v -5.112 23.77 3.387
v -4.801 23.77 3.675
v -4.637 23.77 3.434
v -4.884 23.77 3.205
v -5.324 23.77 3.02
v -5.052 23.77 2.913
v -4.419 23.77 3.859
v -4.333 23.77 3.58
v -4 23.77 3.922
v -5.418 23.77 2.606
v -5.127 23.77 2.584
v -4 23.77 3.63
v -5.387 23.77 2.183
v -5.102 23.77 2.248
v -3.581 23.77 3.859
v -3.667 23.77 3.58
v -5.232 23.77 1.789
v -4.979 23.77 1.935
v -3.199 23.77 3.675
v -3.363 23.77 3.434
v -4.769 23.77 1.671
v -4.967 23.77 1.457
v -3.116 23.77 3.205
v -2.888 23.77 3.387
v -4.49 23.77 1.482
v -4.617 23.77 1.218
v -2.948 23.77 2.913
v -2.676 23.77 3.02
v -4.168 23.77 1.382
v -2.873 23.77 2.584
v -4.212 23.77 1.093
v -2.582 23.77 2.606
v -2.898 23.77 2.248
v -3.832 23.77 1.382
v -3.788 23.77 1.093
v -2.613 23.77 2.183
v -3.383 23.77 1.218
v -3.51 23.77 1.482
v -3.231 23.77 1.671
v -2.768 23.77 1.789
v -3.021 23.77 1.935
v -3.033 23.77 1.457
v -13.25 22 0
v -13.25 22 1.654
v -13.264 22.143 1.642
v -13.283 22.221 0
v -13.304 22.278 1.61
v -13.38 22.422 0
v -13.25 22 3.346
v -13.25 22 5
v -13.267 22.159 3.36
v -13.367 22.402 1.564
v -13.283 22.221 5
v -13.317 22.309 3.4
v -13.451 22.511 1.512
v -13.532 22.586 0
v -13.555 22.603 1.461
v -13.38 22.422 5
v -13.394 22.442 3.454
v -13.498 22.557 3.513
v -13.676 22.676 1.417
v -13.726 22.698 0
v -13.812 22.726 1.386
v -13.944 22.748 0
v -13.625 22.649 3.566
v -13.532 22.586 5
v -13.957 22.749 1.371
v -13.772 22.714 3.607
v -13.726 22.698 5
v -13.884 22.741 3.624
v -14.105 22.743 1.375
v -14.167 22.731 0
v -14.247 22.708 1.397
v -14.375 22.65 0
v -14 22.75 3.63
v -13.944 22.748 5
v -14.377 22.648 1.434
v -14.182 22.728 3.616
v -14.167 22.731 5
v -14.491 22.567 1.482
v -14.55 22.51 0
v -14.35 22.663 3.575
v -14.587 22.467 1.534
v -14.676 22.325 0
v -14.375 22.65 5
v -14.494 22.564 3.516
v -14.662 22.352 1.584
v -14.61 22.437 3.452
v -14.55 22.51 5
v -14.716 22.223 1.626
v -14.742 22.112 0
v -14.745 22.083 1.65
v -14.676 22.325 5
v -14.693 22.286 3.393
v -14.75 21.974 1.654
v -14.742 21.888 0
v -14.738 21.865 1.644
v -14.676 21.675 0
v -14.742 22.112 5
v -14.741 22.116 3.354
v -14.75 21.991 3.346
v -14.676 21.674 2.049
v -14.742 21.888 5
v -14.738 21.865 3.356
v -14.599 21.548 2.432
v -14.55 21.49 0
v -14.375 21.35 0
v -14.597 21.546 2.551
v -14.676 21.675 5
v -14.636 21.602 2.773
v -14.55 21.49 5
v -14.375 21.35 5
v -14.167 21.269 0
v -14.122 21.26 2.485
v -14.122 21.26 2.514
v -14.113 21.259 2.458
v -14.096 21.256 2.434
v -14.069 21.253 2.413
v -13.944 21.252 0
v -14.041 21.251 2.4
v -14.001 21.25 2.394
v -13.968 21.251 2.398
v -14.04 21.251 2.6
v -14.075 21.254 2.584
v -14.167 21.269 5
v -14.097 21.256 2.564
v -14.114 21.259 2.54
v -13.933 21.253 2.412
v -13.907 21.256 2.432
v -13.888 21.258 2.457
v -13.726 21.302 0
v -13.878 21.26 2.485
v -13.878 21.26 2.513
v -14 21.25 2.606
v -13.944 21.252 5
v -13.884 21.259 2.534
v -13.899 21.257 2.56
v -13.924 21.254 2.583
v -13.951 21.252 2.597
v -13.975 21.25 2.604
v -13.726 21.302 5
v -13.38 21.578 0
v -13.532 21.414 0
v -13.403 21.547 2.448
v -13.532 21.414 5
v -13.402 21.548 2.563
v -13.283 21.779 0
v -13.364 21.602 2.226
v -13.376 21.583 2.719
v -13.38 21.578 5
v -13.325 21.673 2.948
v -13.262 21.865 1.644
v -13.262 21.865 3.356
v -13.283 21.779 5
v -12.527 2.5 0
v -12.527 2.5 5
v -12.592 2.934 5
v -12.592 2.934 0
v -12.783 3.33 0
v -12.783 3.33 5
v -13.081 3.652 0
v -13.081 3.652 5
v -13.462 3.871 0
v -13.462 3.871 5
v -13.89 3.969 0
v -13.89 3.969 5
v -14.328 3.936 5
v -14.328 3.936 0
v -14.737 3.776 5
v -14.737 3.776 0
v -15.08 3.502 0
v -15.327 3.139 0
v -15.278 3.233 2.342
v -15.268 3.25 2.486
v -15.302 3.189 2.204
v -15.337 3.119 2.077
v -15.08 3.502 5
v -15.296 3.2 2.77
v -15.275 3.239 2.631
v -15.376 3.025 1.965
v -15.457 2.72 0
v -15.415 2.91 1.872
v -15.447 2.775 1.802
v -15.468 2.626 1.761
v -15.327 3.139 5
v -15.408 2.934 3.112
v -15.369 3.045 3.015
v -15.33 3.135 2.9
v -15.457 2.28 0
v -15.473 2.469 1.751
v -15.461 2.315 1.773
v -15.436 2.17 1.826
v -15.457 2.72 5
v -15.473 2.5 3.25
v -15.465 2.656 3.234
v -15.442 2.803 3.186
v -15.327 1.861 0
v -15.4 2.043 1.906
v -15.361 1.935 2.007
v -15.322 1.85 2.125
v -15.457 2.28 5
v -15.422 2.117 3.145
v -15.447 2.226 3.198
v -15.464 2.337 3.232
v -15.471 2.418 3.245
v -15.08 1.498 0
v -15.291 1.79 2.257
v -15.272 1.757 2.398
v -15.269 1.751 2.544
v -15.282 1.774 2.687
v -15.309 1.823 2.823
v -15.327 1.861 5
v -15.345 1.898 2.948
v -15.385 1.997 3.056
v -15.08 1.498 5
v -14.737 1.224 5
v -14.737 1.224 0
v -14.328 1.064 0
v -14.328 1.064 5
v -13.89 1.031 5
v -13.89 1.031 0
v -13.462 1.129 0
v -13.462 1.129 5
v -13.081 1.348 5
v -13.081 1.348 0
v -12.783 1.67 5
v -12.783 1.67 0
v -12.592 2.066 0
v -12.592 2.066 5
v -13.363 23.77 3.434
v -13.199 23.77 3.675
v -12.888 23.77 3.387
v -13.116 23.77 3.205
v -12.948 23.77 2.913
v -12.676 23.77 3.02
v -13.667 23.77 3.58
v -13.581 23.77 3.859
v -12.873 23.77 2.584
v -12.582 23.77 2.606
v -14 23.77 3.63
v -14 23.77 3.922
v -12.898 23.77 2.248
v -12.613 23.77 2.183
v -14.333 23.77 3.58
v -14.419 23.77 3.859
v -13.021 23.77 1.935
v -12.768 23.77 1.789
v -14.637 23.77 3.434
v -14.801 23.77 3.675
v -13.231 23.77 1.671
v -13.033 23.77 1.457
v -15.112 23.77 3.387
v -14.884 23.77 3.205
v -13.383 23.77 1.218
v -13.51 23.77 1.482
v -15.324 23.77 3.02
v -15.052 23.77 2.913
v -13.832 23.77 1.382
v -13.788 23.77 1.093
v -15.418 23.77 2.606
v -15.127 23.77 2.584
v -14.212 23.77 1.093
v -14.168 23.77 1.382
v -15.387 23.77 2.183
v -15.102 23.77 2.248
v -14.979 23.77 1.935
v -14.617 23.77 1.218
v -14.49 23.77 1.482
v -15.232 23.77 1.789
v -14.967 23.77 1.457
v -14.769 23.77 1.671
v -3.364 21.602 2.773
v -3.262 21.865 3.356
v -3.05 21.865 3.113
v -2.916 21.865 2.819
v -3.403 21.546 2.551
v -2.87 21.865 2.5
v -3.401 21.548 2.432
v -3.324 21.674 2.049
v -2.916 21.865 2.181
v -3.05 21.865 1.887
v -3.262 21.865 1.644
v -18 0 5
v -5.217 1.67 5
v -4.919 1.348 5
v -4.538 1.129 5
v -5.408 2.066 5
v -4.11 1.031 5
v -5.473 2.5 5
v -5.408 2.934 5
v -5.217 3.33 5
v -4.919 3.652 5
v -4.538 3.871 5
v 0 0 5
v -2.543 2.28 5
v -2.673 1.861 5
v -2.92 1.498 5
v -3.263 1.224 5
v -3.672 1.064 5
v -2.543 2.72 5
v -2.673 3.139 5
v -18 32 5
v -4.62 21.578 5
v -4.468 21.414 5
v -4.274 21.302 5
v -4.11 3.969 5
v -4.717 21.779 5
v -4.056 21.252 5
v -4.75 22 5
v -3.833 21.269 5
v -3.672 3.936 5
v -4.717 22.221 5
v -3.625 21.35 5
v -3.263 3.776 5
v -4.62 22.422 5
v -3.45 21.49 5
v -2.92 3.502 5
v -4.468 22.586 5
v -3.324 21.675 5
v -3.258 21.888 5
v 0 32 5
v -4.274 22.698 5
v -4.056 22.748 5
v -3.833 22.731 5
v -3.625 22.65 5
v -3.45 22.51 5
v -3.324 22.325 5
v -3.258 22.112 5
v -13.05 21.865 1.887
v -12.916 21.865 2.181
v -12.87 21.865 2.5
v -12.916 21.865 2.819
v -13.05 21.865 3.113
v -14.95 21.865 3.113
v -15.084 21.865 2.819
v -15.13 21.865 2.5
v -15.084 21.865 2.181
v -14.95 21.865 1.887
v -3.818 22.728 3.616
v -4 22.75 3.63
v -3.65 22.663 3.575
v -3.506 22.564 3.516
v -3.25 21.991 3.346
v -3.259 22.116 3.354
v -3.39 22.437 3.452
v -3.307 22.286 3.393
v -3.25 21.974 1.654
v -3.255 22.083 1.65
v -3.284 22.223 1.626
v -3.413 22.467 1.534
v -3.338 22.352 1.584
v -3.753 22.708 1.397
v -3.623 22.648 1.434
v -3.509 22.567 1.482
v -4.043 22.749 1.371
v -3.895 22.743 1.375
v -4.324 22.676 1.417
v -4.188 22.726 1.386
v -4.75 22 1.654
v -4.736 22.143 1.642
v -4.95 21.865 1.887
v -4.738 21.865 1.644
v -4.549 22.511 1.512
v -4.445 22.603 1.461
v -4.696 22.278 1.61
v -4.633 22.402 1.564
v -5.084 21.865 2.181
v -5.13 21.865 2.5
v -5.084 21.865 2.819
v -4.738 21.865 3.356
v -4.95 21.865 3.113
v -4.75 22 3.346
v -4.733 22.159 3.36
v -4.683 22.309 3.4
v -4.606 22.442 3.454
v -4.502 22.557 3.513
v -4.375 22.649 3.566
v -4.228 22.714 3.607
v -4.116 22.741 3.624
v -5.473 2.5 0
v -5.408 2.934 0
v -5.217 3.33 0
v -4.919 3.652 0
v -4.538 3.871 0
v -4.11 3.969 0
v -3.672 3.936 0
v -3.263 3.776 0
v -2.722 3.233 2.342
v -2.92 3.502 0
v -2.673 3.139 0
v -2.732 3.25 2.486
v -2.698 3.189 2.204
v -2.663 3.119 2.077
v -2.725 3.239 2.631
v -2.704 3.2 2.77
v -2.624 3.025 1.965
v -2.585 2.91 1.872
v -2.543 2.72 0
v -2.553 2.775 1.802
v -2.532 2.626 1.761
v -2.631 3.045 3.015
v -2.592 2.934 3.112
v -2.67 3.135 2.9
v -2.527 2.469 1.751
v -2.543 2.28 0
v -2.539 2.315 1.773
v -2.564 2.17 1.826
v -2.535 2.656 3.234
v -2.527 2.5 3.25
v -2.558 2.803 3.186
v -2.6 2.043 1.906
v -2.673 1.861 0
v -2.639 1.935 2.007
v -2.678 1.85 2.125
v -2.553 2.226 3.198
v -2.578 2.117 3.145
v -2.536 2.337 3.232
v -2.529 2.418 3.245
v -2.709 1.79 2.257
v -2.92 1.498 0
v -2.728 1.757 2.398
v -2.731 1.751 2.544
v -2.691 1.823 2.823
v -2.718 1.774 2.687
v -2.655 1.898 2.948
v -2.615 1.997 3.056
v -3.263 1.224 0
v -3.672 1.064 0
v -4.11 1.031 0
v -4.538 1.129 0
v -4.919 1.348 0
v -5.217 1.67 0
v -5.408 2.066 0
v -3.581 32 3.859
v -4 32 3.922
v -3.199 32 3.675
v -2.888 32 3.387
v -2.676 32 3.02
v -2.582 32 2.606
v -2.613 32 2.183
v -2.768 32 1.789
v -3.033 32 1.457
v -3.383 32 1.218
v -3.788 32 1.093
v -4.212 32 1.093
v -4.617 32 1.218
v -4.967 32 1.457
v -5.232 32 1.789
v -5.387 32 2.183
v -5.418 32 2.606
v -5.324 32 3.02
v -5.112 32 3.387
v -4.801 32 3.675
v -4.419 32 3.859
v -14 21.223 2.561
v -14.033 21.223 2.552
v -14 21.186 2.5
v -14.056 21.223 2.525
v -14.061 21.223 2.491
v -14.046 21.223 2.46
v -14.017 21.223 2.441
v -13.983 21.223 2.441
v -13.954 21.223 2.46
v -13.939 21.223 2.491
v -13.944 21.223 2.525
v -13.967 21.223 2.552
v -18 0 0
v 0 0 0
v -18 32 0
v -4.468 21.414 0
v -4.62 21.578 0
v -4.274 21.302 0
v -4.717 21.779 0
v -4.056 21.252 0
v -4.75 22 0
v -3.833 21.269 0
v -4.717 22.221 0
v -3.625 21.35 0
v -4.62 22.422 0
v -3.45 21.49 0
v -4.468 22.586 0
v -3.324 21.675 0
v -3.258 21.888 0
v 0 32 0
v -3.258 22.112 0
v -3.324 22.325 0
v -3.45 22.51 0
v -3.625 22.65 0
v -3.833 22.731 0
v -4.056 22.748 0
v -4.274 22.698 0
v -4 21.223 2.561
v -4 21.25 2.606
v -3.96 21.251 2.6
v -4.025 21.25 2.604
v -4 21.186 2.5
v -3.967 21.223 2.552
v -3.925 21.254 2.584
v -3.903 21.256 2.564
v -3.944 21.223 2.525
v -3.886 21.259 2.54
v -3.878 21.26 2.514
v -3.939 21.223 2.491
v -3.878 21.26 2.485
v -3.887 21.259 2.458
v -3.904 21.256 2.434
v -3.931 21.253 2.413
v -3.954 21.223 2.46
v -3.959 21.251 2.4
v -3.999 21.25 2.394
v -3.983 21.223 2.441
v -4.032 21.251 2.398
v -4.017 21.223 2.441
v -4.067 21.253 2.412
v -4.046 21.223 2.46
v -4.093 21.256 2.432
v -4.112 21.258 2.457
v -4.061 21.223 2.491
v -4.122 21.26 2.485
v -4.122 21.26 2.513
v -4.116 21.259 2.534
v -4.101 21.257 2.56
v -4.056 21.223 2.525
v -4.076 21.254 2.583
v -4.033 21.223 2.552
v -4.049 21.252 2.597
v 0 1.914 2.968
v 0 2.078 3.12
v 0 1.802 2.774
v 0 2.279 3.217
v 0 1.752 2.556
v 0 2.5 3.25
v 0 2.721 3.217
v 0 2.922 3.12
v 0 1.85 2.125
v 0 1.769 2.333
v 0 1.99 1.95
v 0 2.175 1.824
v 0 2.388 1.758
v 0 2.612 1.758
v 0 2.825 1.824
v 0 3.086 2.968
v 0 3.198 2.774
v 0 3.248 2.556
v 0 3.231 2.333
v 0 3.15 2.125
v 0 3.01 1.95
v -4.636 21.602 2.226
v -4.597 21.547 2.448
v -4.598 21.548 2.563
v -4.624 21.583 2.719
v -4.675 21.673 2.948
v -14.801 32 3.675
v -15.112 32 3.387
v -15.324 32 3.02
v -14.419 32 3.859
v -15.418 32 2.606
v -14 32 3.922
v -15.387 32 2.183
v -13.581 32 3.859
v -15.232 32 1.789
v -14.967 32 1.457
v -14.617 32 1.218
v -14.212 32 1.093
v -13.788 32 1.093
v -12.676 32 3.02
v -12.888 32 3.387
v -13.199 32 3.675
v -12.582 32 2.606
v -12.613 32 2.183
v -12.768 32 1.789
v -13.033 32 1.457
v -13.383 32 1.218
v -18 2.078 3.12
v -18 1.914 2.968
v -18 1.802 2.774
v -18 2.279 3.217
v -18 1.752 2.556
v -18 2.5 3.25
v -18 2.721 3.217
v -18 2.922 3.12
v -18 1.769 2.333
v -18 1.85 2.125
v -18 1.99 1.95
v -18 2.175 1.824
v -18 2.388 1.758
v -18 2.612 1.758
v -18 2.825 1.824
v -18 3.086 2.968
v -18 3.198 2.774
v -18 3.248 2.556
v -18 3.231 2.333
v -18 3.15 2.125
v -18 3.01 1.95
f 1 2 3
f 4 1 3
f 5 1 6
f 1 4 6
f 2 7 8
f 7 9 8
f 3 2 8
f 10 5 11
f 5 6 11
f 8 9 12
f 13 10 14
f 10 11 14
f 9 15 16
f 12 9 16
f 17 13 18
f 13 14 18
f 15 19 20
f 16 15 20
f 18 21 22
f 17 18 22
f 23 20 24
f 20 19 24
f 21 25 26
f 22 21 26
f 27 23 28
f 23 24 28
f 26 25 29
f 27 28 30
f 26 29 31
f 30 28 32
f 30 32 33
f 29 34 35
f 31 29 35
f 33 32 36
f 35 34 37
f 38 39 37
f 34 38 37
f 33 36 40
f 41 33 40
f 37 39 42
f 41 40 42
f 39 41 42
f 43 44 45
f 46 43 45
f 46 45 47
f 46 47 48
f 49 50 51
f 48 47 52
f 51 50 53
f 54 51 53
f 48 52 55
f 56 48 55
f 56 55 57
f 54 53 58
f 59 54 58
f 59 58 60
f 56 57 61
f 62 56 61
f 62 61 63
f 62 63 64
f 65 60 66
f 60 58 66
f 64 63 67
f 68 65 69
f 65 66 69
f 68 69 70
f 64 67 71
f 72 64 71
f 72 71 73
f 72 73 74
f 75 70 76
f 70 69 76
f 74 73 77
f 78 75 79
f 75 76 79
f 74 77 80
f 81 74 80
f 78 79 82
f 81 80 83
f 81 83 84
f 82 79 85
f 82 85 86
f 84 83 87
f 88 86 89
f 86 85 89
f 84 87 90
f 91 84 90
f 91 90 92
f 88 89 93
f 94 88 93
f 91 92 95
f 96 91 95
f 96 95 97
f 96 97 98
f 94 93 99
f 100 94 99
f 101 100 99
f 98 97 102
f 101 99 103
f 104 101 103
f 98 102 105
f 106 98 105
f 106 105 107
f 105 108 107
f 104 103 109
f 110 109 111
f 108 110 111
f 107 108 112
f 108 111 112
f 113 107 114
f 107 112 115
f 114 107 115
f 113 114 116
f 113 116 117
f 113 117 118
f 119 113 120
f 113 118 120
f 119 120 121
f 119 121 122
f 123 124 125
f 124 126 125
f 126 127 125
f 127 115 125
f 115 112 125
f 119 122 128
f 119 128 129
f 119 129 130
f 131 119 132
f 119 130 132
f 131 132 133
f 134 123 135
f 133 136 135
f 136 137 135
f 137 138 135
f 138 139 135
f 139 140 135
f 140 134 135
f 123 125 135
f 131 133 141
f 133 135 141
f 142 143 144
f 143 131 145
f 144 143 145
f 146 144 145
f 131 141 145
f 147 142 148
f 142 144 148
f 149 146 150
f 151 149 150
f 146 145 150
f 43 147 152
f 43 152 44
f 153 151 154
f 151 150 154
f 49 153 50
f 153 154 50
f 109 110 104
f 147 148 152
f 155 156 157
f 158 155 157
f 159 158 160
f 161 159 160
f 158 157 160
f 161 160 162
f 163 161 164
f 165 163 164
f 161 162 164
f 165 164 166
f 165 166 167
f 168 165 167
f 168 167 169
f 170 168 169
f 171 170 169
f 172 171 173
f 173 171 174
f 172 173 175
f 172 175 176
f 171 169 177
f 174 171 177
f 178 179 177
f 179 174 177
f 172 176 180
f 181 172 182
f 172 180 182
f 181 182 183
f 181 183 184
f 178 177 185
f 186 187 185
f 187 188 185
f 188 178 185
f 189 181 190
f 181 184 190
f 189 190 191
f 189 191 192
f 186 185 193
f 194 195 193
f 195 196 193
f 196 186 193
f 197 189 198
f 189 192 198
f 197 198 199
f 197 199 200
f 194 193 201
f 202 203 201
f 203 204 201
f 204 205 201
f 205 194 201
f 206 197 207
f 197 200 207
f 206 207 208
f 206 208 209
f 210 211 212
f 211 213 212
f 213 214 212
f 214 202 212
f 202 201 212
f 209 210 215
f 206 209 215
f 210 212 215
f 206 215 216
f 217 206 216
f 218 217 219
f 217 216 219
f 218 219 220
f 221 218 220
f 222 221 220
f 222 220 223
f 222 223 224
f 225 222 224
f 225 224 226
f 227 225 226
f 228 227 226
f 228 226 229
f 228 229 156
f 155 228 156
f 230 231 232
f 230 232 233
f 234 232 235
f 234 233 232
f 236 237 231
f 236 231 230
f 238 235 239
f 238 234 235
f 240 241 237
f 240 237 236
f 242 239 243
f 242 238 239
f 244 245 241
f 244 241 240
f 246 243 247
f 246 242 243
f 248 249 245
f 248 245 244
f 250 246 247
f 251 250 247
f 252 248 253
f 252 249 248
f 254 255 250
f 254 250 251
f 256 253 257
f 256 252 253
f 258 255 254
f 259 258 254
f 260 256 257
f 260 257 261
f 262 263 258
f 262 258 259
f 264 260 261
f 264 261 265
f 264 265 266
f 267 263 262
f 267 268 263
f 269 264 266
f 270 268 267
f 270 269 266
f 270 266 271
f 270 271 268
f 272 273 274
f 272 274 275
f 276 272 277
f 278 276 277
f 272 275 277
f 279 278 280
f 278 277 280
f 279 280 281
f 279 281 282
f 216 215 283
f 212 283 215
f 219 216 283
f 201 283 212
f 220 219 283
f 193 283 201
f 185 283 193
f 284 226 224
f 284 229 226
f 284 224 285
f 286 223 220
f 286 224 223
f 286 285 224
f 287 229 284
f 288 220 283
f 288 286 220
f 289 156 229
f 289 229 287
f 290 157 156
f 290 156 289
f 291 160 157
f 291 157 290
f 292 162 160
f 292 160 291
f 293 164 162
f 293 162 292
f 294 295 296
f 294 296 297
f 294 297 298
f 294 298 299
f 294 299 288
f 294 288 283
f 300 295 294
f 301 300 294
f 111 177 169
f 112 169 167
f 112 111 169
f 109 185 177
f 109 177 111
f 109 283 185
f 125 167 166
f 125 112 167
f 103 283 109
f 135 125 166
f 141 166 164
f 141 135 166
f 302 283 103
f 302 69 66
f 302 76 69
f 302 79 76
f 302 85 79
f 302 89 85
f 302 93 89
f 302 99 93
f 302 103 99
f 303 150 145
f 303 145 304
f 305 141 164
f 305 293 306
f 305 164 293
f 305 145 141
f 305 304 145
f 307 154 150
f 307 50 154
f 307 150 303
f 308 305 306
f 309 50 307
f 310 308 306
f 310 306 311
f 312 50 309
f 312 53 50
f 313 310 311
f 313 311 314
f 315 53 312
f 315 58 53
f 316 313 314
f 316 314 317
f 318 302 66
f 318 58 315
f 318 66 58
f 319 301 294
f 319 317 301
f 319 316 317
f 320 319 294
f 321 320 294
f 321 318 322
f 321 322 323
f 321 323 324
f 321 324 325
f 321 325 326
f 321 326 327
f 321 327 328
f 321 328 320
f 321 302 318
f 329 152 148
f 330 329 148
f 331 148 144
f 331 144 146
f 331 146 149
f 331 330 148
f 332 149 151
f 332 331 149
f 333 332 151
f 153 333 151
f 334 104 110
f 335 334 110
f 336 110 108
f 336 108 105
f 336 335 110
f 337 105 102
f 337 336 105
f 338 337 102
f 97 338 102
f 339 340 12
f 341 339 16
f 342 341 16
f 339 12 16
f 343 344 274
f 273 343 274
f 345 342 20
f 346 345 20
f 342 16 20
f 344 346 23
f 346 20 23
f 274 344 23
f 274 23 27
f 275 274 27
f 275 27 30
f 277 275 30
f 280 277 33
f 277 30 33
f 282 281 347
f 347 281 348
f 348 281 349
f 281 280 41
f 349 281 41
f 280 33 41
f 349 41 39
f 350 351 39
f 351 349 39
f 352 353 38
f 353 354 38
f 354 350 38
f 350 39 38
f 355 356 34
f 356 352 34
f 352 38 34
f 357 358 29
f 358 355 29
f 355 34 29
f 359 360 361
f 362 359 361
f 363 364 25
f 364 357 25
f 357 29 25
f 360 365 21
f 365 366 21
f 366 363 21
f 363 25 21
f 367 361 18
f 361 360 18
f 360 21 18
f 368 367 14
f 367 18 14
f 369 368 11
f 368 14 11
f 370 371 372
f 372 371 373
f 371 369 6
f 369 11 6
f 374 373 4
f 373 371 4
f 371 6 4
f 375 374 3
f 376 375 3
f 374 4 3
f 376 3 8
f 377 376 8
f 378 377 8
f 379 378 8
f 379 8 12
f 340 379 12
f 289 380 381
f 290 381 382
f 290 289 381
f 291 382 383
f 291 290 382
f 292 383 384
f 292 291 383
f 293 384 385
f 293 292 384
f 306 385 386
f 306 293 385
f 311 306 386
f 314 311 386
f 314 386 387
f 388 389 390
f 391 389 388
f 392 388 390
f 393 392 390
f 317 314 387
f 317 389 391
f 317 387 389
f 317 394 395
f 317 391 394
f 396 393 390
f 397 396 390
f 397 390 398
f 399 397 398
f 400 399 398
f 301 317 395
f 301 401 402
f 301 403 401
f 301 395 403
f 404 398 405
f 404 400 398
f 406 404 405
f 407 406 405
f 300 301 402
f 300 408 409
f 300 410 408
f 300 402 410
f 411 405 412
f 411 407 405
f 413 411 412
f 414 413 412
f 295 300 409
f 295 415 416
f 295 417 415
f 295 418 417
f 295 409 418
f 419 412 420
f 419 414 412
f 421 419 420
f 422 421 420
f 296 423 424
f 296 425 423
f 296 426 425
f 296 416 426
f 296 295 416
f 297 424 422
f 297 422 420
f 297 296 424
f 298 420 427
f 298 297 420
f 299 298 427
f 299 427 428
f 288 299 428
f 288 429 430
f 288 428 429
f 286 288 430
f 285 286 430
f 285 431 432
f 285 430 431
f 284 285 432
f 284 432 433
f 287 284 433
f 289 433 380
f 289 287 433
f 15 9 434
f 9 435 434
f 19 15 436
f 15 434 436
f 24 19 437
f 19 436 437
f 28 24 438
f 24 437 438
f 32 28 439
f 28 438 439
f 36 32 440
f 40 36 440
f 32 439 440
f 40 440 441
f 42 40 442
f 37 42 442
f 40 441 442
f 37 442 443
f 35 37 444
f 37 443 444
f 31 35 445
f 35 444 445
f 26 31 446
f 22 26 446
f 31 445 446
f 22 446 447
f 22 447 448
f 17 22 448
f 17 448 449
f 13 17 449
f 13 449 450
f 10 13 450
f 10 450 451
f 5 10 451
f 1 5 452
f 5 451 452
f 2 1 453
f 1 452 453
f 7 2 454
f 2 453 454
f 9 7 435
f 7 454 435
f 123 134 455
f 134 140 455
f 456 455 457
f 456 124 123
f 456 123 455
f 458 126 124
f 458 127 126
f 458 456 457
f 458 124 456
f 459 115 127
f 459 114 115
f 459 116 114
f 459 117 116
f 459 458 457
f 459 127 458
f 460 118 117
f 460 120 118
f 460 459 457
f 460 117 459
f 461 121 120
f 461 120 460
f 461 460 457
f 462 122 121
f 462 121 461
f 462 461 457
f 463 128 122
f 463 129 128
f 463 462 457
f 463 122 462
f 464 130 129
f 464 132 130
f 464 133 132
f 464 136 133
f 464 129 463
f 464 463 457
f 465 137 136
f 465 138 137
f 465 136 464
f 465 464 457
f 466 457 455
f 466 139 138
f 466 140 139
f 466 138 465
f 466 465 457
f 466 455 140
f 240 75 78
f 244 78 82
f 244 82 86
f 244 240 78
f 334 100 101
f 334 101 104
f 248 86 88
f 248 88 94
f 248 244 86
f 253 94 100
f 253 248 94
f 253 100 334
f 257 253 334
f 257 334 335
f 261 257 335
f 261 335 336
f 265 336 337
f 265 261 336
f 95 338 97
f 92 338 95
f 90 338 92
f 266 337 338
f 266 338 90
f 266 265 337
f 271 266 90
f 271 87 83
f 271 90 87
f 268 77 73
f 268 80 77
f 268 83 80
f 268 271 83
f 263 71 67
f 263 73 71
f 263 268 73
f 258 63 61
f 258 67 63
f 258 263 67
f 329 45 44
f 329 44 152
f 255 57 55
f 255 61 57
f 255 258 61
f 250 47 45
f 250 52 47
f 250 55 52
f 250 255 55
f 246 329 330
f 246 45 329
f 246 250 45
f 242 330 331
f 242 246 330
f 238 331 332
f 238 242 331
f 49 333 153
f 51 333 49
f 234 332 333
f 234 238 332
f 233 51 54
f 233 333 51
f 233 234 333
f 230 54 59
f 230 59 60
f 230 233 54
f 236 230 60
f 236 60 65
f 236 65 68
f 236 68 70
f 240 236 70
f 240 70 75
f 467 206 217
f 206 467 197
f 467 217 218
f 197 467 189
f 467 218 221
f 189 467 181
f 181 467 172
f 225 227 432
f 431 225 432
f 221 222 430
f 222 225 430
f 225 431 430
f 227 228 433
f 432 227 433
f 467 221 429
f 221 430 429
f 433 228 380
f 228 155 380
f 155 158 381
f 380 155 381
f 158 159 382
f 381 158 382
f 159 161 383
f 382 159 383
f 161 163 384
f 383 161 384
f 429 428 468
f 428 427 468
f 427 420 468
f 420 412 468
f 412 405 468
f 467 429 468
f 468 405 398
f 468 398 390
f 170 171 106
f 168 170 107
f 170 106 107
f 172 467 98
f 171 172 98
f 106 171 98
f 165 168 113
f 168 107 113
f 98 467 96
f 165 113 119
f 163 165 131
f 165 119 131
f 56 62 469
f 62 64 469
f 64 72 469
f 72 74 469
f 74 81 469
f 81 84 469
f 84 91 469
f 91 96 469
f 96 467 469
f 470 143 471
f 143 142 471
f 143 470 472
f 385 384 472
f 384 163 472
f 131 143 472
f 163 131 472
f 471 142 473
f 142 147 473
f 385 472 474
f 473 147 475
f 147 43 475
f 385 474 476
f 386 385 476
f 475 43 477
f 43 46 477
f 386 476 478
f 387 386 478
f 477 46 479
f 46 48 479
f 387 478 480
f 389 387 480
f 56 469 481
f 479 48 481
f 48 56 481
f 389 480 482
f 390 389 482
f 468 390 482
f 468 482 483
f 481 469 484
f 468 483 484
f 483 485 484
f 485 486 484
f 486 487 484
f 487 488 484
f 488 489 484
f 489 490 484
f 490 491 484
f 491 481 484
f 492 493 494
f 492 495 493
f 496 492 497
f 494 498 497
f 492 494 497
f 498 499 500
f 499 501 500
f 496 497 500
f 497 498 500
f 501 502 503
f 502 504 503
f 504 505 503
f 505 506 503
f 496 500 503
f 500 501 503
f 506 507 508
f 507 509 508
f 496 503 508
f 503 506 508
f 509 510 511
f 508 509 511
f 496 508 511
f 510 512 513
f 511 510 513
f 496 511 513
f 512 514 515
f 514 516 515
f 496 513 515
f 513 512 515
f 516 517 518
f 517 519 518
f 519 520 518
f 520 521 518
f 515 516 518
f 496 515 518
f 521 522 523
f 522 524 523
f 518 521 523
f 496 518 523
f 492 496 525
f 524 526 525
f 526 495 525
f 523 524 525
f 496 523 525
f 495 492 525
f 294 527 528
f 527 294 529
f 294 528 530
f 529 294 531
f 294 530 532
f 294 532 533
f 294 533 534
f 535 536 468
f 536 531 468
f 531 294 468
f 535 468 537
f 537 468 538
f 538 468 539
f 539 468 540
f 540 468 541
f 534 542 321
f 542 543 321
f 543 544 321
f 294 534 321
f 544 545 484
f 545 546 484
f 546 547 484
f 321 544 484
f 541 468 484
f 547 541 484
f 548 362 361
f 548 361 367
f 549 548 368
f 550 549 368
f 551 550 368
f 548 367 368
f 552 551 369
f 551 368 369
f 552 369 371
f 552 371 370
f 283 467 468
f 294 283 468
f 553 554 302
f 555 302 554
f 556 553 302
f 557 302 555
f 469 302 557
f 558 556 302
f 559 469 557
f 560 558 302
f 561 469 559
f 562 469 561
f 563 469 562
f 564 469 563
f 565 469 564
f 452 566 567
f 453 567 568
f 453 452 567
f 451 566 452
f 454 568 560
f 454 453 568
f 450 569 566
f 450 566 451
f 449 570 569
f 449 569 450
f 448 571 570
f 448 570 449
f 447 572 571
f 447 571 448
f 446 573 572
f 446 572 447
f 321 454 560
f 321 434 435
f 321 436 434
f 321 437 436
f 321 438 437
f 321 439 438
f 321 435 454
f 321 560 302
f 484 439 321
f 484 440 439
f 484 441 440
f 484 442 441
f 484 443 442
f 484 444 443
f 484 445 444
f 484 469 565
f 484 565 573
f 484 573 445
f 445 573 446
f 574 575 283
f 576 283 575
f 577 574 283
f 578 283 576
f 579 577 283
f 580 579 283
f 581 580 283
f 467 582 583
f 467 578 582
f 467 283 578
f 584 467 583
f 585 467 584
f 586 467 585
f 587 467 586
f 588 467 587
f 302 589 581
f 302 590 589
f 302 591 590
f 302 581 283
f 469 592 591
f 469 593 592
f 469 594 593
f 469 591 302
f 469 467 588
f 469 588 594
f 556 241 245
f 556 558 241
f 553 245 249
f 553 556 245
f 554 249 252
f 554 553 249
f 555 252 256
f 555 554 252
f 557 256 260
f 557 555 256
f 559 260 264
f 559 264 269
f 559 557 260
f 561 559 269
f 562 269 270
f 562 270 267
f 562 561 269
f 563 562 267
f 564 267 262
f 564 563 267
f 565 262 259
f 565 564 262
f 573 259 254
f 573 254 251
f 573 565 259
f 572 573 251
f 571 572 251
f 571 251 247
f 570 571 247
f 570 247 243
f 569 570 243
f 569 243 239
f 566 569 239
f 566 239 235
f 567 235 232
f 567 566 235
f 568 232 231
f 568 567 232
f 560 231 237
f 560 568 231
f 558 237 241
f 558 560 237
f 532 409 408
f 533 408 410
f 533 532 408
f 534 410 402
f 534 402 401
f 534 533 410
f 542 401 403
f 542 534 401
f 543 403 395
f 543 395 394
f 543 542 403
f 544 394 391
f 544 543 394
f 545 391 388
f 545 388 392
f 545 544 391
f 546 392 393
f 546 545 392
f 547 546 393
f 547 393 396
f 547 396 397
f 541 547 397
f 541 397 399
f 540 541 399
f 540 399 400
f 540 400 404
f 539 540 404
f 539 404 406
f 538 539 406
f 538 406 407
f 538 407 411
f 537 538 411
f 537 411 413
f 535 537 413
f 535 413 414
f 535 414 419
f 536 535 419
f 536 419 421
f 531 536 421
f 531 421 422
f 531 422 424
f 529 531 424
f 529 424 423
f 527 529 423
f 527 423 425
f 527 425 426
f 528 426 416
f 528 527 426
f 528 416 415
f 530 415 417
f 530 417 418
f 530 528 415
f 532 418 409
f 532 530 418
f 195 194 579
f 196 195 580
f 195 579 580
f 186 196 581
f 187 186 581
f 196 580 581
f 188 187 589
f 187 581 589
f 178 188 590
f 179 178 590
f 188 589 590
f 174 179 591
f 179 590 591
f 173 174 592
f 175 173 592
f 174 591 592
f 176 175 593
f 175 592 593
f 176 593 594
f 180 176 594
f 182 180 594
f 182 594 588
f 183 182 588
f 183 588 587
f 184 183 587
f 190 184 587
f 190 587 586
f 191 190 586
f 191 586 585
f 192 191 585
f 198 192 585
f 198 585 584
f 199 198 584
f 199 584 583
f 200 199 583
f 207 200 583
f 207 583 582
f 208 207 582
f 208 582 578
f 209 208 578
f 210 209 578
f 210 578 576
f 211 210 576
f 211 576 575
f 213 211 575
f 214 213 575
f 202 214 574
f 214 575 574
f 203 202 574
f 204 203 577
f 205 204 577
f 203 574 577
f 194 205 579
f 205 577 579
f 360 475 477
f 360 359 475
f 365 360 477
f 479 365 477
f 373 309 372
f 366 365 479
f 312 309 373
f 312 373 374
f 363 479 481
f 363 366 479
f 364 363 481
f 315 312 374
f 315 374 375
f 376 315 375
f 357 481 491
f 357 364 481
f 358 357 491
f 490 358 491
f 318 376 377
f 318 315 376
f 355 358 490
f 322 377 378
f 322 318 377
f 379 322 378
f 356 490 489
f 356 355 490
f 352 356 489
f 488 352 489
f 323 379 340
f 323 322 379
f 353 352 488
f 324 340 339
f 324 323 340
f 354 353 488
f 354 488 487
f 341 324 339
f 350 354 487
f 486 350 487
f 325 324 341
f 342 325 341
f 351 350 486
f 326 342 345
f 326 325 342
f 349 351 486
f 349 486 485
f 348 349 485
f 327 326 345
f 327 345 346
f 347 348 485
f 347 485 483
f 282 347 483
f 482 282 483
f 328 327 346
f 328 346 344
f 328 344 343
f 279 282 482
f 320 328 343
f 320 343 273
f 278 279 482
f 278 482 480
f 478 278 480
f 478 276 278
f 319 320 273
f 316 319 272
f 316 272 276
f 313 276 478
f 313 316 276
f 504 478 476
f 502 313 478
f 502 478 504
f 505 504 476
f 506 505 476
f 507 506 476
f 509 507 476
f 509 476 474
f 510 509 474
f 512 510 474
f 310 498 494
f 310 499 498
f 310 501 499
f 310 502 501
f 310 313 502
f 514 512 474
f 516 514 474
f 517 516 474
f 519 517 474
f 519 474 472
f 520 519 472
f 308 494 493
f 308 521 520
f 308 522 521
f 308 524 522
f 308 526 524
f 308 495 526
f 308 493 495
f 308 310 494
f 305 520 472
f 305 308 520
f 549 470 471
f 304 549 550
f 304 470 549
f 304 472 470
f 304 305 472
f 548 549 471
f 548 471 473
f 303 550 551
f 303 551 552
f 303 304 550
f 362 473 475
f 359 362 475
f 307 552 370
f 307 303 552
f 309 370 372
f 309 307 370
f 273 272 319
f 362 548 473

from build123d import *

# Parameters (mm, degrees)
SKETCH1_W      = 18
SKETCH1_H      = 32
EXTRUDE1_DEPTH = 5
SKETCH3_R      = 0.75
SKETCH3_R_2    = 1.4732
EXTRUDE2_DEPTH = 6
SKETCH4_R      = 0.75
EXTRUDE3_DEPTH = 2.794


with BuildPart() as part:
    # Sketch1 → Extrude1 (new body)
    with BuildSketch(Plane.XY):
        with Locations((-9, 16)):
            Rectangle(SKETCH1_W, SKETCH1_H)
    extrude(amount=EXTRUDE1_DEPTH)

    # Sketch2 → #4-40 Tapped Hole1 (revolve, cut)
    with BuildSketch(Plane(origin=(-14, 32, 2.5), x_dir=(0, 0, 1), z_dir=(1, 0, 0))):
        Polygon((0, 0), (0, 10.813752758), (1.1303, 10.1346), (1.1303, 8.2296), (1.4224, 8.2296), (1.4224, 0), align=None)
    f_4_40_tapped_hole1 = revolve(axis=Axis((-14, 38.35, 2.5), (0, -1, 0)), mode=Mode.SUBTRACT)

    # Sketch3 → Extrude2 (cut, through all)
    with BuildSketch(Plane.XY.offset(5)):
        with Locations((-14, 22)):
            Circle(SKETCH3_R)
        with Locations((-14, 2.5)):
            Circle(SKETCH3_R_2)
    extrude2 = extrude(amount=-EXTRUDE2_DEPTH, mode=Mode.SUBTRACT)

    # Sketch4 → Extrude3 (cut)
    with BuildSketch(Plane.ZY.offset(18)):
        with Locations((2.5, 2.5)):
            Circle(SKETCH4_R)
    extrude3 = extrude(amount=-EXTRUDE3_DEPTH, mode=Mode.SUBTRACT)

    # Mirror2: #4-40 Tapped Hole1, Extrude2, Extrude3 across plane
    add(f_4_40_tapped_hole1.mirror(Plane(origin=(-9, 0, 0), x_dir=(0, 0, 1), z_dir=(1, 0, 0))), mode=Mode.SUBTRACT)
    add(extrude2.mirror(Plane(origin=(-9, 0, 0), x_dir=(0, 0, 1), z_dir=(1, 0, 0))), mode=Mode.SUBTRACT)
    add(extrude3.mirror(Plane(origin=(-9, 0, 0), x_dir=(0, 0, 1), z_dir=(1, 0, 0))), mode=Mode.SUBTRACT)


solid = part.part
